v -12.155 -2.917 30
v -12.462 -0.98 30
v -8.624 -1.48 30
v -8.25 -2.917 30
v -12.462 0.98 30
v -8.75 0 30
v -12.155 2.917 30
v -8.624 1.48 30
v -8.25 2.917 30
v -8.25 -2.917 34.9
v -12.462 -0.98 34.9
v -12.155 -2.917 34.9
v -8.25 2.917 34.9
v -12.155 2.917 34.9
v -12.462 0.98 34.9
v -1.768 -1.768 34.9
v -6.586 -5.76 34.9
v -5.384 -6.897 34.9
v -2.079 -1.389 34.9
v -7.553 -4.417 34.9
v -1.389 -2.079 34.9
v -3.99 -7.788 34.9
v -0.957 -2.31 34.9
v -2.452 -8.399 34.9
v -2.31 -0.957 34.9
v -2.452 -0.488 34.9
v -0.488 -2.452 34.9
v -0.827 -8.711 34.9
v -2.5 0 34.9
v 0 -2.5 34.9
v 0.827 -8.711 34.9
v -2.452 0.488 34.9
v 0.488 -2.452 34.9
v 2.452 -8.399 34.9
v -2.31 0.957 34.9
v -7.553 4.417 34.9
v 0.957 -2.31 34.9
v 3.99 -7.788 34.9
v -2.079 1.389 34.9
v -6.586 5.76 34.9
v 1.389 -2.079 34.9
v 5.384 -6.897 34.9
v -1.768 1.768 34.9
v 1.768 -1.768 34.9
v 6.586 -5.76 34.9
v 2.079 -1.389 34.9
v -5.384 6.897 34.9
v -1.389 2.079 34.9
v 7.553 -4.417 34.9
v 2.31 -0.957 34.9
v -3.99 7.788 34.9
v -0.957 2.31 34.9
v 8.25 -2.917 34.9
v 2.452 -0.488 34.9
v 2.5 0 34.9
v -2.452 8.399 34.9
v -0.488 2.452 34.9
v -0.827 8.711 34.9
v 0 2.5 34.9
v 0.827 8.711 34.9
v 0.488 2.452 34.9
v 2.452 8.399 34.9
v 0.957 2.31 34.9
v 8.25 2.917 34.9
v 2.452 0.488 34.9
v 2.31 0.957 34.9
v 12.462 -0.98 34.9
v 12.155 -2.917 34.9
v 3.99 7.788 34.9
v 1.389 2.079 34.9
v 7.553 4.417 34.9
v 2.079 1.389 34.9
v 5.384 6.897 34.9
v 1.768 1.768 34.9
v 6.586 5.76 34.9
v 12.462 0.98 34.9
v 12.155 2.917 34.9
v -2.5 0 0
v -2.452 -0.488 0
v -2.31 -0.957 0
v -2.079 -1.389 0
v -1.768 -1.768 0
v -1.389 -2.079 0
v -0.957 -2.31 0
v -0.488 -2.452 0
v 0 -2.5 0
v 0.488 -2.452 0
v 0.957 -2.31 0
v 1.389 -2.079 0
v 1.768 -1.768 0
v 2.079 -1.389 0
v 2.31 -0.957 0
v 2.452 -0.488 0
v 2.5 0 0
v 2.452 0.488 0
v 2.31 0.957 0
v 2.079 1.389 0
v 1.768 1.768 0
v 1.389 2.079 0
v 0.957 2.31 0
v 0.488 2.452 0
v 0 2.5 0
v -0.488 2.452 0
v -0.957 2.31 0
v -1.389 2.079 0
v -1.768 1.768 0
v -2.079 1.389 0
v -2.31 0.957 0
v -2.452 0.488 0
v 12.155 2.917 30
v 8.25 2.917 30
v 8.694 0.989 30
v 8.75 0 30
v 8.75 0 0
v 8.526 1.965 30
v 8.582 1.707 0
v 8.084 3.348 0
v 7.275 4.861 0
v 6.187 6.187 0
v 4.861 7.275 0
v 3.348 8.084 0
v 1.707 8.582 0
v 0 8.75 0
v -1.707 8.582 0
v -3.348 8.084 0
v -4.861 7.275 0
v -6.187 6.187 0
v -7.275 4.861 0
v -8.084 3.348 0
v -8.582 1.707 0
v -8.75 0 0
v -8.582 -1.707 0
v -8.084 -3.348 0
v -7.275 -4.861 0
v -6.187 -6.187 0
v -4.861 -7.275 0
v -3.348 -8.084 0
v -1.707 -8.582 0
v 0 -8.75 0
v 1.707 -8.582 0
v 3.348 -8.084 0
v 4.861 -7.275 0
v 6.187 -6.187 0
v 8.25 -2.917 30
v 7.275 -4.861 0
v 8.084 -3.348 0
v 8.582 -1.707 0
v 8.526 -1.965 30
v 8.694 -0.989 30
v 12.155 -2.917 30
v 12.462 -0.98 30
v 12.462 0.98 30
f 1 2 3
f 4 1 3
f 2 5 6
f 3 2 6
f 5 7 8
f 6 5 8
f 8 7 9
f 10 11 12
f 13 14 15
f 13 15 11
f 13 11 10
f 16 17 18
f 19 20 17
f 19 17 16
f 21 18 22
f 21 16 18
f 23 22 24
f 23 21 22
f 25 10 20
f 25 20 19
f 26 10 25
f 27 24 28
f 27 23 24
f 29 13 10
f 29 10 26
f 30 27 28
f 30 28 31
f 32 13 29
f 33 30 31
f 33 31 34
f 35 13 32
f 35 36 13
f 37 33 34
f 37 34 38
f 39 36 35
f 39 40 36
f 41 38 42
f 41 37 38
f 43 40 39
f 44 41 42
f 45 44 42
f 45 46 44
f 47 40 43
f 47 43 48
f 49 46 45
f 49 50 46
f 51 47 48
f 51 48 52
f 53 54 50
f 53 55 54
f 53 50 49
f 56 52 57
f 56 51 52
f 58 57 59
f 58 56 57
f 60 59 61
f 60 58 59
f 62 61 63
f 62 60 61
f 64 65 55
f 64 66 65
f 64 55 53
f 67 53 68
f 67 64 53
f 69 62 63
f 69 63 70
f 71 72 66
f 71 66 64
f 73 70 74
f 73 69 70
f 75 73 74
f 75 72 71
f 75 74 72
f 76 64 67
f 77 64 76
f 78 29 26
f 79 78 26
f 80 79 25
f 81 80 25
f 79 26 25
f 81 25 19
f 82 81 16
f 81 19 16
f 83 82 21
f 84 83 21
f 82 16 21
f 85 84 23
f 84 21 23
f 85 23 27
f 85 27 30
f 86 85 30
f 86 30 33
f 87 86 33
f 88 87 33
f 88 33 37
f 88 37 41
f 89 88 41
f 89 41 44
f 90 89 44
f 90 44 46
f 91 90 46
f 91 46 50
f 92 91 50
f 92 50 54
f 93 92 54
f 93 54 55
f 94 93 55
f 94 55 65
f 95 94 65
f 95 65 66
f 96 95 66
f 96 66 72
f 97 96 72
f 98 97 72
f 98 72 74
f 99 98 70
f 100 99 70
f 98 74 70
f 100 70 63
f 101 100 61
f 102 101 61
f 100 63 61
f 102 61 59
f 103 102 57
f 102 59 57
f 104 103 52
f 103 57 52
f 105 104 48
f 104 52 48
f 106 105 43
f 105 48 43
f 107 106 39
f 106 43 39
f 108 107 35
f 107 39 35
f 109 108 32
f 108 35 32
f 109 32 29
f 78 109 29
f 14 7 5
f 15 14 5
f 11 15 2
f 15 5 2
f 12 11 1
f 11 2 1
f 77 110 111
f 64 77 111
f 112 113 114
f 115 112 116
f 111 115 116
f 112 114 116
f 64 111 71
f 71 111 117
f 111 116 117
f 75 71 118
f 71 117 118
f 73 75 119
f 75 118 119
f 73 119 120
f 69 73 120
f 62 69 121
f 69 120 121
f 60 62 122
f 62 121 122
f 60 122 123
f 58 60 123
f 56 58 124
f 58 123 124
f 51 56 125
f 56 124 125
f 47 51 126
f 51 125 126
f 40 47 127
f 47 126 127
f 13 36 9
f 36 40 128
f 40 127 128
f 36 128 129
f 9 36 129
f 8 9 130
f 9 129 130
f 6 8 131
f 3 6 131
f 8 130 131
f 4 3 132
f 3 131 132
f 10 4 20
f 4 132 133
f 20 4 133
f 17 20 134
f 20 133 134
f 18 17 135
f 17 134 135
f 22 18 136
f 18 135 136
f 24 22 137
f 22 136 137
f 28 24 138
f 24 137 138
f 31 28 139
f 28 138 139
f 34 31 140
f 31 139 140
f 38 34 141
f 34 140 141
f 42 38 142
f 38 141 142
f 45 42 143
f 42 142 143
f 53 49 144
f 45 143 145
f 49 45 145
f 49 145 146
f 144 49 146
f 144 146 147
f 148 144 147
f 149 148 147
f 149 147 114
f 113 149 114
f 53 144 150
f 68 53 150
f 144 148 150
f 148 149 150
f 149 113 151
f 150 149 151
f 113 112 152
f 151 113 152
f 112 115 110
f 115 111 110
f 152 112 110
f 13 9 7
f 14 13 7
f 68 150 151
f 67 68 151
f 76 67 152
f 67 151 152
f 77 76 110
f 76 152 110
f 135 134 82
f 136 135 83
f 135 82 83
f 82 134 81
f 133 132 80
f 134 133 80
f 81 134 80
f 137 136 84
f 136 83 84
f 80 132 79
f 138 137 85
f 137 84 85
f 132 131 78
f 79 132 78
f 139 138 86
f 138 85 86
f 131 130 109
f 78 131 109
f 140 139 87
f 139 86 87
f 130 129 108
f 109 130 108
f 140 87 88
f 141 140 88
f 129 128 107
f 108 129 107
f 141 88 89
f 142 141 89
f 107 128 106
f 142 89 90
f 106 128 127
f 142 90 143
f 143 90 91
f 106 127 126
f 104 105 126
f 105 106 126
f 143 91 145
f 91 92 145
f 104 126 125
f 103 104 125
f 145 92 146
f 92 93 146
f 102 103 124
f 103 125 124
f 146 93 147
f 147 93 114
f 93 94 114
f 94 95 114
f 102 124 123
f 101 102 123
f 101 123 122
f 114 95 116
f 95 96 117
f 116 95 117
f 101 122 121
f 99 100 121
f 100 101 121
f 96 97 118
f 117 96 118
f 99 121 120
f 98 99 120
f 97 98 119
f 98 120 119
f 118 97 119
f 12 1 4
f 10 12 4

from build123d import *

# Parameters (mm, degrees)
F0_R     = 8.75
F1_DEPTH = 30
F3_DEPTH = 4.9
F5_D     = 5


with BuildPart() as f1:
    # F0 (on Top) → F1 (new body)
    with BuildSketch(Plane.XY):
        Circle(F0_R)
    extrude(amount=F1_DEPTH)

    # F2 (on face) → F3 (join)
    with BuildSketch(Plane.XY.offset(30)):
        with BuildLine():
            ThreePointArc((8.249579, 2.916667), (0, 8.75), (-8.249579, 2.916667))
            Line((-8.249579, 2.916667), (-12.15496, 2.916667))
            ThreePointArc((-12.15496, 2.916667), (-12.5, 0), (-12.15496, -2.916667))
            Line((-12.15496, -2.916667), (-8.249579, -2.916667))
            ThreePointArc((-8.249579, -2.916667), (0, -8.75), (8.249579, -2.916667))
            Line((8.249579, -2.916667), (12.15496, -2.916667))
            ThreePointArc((12.15496, -2.916667), (12.5, 0), (12.15496, 2.916667))
            Line((12.15496, 2.916667), (8.249579, 2.916667))
        make_face()
    extrude(amount=F3_DEPTH)

    # F5 (through all)
    with Locations(Plane(origin=(0, 0, 0), x_dir=(1, 0, 0), z_dir=(0, 0, -1))):
        with Locations((0, 0)):
            Hole(F5_D / 2)


solid = f1.part
